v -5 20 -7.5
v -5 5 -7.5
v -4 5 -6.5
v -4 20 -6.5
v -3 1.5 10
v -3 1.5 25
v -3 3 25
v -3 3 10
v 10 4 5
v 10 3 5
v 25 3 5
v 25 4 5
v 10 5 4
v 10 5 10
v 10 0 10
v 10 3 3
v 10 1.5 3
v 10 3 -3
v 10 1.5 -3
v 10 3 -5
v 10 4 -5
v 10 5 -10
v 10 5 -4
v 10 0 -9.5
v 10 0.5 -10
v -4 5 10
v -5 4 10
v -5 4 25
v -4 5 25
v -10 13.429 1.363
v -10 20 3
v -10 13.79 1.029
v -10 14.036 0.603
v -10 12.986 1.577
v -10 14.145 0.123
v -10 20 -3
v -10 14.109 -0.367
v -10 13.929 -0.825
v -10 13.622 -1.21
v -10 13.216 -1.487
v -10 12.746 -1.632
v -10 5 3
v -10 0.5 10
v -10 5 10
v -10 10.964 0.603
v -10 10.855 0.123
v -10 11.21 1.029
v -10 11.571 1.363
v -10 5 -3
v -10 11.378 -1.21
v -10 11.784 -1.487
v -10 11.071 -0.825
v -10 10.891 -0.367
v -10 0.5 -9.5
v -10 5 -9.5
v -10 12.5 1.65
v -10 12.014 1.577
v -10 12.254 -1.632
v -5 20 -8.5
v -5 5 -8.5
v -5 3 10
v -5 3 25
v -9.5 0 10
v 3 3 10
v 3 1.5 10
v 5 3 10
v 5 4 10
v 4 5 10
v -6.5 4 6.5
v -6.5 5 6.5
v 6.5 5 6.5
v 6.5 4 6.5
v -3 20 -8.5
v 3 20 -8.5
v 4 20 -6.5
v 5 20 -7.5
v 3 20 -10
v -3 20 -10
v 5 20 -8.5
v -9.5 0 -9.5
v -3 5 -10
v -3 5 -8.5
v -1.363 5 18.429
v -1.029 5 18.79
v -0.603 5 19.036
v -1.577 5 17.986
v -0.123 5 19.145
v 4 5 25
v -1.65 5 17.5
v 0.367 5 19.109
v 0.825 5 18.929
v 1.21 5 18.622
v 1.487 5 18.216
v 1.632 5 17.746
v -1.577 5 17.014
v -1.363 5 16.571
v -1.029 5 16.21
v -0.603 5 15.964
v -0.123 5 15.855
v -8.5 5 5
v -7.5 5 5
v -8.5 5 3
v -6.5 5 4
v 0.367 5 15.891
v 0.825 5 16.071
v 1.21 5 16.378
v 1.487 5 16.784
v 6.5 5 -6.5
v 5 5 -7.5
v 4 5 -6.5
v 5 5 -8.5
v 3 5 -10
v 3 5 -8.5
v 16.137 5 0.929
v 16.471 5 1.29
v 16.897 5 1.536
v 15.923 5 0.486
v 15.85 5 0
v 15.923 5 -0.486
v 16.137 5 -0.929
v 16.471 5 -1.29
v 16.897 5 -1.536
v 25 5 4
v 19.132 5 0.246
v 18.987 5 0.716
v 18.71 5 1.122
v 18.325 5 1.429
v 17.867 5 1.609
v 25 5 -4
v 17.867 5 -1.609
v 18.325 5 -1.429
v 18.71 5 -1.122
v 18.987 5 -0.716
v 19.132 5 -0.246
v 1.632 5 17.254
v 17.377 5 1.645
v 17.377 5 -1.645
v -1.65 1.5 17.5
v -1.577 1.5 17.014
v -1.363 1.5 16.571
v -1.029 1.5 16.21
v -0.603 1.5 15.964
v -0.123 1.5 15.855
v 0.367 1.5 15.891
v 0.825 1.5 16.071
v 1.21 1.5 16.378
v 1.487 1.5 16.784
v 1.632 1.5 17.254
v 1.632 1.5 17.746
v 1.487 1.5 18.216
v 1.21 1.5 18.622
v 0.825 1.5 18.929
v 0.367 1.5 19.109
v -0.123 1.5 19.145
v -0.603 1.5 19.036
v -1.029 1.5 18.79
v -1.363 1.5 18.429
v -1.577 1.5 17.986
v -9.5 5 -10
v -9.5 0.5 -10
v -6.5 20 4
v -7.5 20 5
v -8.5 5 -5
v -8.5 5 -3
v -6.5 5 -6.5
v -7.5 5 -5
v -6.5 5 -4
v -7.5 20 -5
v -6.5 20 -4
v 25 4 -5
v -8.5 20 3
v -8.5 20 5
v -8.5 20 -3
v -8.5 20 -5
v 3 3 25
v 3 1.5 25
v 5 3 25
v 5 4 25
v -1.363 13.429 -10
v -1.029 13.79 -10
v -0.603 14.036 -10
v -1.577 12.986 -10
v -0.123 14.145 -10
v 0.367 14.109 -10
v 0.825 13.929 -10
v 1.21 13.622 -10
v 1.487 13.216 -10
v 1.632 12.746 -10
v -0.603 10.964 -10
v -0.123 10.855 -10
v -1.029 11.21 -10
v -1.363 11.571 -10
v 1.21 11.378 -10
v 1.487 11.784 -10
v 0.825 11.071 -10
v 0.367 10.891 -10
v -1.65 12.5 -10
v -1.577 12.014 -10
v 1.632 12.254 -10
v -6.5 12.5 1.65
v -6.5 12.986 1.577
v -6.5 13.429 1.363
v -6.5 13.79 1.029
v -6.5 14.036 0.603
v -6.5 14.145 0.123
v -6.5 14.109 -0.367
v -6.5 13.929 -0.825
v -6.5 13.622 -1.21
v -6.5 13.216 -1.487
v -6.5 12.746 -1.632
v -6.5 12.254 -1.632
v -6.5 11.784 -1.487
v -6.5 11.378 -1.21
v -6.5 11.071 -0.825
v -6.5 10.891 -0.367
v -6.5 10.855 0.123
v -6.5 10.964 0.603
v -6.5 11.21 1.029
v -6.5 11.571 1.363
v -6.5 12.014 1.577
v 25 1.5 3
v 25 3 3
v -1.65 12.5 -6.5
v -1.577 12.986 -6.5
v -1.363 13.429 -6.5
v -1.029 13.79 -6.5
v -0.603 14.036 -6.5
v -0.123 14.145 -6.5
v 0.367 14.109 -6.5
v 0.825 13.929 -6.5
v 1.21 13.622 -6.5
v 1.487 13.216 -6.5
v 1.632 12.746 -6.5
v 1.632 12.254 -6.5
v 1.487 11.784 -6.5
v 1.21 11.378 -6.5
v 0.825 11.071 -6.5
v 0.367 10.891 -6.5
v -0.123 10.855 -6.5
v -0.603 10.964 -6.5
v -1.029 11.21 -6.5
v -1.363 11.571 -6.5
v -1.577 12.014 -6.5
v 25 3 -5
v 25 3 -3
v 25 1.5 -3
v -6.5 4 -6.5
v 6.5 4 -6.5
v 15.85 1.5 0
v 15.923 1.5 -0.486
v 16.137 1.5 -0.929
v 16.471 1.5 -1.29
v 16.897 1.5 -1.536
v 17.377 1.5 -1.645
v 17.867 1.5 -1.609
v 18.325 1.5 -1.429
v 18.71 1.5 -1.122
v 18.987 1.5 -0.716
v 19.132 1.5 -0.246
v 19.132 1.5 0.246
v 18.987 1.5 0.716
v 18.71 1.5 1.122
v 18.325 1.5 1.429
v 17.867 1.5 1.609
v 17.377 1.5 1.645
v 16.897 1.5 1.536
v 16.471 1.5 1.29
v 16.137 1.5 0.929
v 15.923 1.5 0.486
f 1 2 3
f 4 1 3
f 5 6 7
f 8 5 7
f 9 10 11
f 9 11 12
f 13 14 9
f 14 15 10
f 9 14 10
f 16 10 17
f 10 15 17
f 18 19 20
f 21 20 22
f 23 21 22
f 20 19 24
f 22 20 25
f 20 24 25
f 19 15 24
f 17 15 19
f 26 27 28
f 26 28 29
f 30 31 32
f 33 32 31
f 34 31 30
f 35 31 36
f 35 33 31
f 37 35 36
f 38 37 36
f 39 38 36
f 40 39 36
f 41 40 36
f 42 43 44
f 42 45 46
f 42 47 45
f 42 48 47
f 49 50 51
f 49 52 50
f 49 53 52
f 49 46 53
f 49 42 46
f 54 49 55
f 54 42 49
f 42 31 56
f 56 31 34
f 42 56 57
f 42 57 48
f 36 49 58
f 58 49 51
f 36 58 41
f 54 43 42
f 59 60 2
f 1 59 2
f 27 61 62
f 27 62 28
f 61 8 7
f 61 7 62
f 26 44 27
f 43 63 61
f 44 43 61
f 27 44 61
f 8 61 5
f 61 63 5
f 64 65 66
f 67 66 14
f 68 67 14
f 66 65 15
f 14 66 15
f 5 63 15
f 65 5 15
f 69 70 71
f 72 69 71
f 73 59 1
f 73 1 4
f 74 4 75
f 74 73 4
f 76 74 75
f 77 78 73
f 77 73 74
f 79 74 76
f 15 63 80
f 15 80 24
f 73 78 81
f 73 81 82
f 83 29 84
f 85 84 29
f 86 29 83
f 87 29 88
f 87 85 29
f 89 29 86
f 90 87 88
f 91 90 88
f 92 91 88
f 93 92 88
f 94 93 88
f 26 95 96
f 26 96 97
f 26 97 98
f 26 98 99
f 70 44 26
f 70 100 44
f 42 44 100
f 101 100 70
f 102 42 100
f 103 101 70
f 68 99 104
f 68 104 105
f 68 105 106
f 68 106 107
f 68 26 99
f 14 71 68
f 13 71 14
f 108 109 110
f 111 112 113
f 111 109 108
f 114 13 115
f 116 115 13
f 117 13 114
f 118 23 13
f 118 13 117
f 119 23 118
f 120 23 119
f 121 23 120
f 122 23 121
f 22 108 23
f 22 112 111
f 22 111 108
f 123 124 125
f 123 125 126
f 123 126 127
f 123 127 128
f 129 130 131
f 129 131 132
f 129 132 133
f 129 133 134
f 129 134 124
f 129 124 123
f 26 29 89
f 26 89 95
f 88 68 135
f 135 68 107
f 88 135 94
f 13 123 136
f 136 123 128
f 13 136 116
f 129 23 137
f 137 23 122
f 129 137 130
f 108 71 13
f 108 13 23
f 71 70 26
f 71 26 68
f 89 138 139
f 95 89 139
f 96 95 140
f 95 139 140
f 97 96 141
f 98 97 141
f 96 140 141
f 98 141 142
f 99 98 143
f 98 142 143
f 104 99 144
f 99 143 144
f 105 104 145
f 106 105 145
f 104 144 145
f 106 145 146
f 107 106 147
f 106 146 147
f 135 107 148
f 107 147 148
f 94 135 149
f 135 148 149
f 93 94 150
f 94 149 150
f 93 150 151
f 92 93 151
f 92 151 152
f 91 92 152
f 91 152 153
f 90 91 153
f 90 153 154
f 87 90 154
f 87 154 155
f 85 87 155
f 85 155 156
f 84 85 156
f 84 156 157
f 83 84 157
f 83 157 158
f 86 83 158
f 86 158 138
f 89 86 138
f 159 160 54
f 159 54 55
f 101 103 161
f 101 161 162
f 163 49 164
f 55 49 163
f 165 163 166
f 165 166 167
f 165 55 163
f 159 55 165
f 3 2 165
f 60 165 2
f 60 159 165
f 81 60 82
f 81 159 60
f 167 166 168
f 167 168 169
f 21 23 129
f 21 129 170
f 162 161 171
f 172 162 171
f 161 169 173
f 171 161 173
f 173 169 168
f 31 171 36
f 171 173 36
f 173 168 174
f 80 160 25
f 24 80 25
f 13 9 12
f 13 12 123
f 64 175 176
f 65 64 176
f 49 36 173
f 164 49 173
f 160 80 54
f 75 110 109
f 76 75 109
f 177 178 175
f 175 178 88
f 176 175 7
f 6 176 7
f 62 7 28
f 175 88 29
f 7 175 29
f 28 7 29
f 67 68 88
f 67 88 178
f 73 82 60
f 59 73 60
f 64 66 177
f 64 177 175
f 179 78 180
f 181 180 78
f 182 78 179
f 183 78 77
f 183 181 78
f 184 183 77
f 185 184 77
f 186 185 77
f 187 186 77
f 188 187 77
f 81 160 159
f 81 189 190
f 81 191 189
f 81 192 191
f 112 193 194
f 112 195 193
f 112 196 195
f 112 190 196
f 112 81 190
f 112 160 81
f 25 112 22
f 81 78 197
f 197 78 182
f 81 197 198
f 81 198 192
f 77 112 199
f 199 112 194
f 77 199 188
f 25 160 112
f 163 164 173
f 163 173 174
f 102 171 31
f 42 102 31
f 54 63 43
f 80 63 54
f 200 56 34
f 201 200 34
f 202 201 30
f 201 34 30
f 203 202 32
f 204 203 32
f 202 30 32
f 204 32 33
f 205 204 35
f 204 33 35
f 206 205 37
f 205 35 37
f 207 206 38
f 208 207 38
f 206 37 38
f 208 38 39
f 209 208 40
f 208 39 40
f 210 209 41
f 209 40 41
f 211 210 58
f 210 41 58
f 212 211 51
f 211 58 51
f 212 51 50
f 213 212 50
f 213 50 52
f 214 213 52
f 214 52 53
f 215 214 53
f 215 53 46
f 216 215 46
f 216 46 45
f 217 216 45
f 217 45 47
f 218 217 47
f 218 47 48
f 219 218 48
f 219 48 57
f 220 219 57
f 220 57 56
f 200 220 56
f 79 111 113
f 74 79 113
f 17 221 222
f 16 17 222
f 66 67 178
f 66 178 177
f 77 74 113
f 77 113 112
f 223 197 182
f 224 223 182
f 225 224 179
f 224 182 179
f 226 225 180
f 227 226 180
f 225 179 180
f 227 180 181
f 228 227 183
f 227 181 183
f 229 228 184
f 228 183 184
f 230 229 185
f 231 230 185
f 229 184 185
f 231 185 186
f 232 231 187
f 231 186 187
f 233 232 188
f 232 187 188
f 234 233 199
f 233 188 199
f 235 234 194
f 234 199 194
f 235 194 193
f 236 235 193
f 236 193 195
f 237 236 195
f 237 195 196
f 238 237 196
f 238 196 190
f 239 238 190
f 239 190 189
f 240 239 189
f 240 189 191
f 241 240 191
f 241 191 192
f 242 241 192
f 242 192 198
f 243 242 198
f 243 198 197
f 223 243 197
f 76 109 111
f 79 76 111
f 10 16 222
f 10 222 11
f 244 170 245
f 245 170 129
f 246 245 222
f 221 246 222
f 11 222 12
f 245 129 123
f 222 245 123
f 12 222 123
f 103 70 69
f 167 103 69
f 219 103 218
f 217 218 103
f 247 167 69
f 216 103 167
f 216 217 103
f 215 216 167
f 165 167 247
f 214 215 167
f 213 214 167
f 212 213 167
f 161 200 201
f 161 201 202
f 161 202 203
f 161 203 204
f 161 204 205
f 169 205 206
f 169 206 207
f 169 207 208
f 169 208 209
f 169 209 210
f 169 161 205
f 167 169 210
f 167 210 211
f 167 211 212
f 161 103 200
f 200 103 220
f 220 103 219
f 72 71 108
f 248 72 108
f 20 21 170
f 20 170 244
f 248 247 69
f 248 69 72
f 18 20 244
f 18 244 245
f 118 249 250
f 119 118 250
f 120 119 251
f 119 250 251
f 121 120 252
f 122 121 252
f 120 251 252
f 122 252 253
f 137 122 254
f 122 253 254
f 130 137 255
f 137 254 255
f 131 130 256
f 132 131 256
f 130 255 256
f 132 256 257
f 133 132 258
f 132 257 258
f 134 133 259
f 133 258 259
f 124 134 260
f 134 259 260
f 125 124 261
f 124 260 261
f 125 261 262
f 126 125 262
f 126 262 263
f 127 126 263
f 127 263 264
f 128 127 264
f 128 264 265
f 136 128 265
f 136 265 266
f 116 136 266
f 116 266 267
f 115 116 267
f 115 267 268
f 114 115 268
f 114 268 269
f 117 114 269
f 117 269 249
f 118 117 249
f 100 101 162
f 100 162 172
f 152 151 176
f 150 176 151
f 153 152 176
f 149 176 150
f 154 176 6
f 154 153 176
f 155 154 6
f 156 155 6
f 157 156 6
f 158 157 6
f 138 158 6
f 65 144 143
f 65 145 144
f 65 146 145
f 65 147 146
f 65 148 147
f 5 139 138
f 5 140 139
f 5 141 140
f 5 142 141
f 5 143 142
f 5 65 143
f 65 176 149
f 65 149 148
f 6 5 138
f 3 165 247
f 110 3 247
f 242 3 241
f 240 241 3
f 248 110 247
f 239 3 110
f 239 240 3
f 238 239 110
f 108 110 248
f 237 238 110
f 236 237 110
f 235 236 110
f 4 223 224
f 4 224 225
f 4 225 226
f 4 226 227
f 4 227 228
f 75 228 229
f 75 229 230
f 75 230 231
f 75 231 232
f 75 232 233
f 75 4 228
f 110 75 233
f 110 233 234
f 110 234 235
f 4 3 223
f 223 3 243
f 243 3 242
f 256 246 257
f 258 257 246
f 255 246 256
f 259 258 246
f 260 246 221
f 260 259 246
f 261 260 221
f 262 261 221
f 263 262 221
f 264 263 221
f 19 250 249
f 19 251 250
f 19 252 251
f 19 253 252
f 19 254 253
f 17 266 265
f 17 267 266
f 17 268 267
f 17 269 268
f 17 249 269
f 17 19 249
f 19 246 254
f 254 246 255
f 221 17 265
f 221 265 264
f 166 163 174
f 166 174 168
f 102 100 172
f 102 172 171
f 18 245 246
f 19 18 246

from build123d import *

# Parameters (mm, degrees)
SKETCH_1_W          = 20
SKETCH_1_H          = 20
EXTRUDE_1_DEPTH     = 5
EXTRUDE_3_DEPTH     = 15
EXTRUDE_4_DEPTH     = 15
EXTRUDE_5_DEPTH     = 15
SKETCH_9_W          = 13
SKETCH_9_H          = 13
CUT_EXTRUDE_4_DEPTH = 1
HOLE_WIZARD_M4_1_D  = 3.3
HOLE_WIZARD_M4_2_D  = 3.3
HOLE_WIZARD_M4_3_D  = 3.3
CHAMFER_1_SIZE      = 0.5


with BuildPart() as part:
    # 草图1 → 凸台-拉伸1 (new body)
    with BuildSketch(Plane(origin=(0, 0, 0), x_dir=(1, 0, 0), z_dir=(0, 1, 0))):
        Rectangle(SKETCH_1_W, SKETCH_1_H)
    extrude(amount=EXTRUDE_1_DEPTH)

    # 草图6 → 凸台-拉伸3 (add)
    with BuildSketch(Plane(origin=(10, 0, 0), x_dir=(0, 0, -1), z_dir=(1, 0, 0))):
        Polygon((-3, 1.5), (-3, 3), (-5, 3), (-5, 4), (-4, 5), (4, 5), (5, 4), (5, 3), (3, 3), (3, 1.5), align=None)
    extrude(amount=EXTRUDE_3_DEPTH)

    # 草图7 → 凸台-拉伸4 (add)
    with BuildSketch(Plane.XY.offset(10)):
        Polygon((-3, 1.5), (-3, 3), (-5, 3), (-5, 4), (-4, 5), (4, 5), (5, 4), (5, 3), (3, 3), (3, 1.5), align=None)
    extrude(amount=EXTRUDE_4_DEPTH)

    # 草图8 → 凸台-拉伸5 (add)
    with BuildSketch(Plane(origin=(0, 5, 0), x_dir=(1, 0, 0), z_dir=(0, 1, 0))):
        Polygon((-10, 3), (-8.5, 3), (-8.5, 5), (-7.5, 5), (-6.5, 4), (-6.5, -4), (-7.5, -5), (-8.5, -5), (-8.5, -3), (-10, -3), align=None)
        Polygon((3, 10), (-3, 10), (-3, 8.5), (-5, 8.5), (-5, 7.5), (-4, 6.5), (4, 6.5), (5, 7.5), (5, 8.5), (3, 8.5), align=None)
    extrude(amount=EXTRUDE_5_DEPTH)

    # 草图9 → 切除-拉伸4 (cut)
    with BuildSketch(Plane(origin=(0, 5, 0), x_dir=(1, 0, 0), z_dir=(0, 1, 0))):
        Rectangle(SKETCH_9_W, SKETCH_9_H)
    extrude(amount=-CUT_EXTRUDE_4_DEPTH, mode=Mode.SUBTRACT)

    # M4 螺纹孔1 (through all)
    with Locations(Plane(origin=(0, 5, 0), x_dir=(1, 0, 0), z_dir=(0, 1, 0))):
        with Locations((0, -17.5), (17.5, 0)):
            Hole(HOLE_WIZARD_M4_1_D / 2)

    # M4 螺纹孔2 (through all)
    with Locations(Plane.XY.offset(-6.5)):
        with Locations((0, 12.5)):
            Hole(HOLE_WIZARD_M4_2_D / 2)

    # M4 螺纹孔3 (through all)
    with Locations(Plane(origin=(-6.5, 0, 0), x_dir=(0, 0, -1), z_dir=(1, 0, 0))):
        with Locations((0, 12.5)):
            Hole(HOLE_WIZARD_M4_3_D / 2)

    # 倒角1
    chamfer_1_edges = [part.edges().sort_by_distance(p)[0] for p in [
        (-10, 0, 0),
        (0, 0, -10),
        (-10, 2.5, -10),
    ]]
    chamfer(chamfer_1_edges, length=CHAMFER_1_SIZE)


solid = part.part
